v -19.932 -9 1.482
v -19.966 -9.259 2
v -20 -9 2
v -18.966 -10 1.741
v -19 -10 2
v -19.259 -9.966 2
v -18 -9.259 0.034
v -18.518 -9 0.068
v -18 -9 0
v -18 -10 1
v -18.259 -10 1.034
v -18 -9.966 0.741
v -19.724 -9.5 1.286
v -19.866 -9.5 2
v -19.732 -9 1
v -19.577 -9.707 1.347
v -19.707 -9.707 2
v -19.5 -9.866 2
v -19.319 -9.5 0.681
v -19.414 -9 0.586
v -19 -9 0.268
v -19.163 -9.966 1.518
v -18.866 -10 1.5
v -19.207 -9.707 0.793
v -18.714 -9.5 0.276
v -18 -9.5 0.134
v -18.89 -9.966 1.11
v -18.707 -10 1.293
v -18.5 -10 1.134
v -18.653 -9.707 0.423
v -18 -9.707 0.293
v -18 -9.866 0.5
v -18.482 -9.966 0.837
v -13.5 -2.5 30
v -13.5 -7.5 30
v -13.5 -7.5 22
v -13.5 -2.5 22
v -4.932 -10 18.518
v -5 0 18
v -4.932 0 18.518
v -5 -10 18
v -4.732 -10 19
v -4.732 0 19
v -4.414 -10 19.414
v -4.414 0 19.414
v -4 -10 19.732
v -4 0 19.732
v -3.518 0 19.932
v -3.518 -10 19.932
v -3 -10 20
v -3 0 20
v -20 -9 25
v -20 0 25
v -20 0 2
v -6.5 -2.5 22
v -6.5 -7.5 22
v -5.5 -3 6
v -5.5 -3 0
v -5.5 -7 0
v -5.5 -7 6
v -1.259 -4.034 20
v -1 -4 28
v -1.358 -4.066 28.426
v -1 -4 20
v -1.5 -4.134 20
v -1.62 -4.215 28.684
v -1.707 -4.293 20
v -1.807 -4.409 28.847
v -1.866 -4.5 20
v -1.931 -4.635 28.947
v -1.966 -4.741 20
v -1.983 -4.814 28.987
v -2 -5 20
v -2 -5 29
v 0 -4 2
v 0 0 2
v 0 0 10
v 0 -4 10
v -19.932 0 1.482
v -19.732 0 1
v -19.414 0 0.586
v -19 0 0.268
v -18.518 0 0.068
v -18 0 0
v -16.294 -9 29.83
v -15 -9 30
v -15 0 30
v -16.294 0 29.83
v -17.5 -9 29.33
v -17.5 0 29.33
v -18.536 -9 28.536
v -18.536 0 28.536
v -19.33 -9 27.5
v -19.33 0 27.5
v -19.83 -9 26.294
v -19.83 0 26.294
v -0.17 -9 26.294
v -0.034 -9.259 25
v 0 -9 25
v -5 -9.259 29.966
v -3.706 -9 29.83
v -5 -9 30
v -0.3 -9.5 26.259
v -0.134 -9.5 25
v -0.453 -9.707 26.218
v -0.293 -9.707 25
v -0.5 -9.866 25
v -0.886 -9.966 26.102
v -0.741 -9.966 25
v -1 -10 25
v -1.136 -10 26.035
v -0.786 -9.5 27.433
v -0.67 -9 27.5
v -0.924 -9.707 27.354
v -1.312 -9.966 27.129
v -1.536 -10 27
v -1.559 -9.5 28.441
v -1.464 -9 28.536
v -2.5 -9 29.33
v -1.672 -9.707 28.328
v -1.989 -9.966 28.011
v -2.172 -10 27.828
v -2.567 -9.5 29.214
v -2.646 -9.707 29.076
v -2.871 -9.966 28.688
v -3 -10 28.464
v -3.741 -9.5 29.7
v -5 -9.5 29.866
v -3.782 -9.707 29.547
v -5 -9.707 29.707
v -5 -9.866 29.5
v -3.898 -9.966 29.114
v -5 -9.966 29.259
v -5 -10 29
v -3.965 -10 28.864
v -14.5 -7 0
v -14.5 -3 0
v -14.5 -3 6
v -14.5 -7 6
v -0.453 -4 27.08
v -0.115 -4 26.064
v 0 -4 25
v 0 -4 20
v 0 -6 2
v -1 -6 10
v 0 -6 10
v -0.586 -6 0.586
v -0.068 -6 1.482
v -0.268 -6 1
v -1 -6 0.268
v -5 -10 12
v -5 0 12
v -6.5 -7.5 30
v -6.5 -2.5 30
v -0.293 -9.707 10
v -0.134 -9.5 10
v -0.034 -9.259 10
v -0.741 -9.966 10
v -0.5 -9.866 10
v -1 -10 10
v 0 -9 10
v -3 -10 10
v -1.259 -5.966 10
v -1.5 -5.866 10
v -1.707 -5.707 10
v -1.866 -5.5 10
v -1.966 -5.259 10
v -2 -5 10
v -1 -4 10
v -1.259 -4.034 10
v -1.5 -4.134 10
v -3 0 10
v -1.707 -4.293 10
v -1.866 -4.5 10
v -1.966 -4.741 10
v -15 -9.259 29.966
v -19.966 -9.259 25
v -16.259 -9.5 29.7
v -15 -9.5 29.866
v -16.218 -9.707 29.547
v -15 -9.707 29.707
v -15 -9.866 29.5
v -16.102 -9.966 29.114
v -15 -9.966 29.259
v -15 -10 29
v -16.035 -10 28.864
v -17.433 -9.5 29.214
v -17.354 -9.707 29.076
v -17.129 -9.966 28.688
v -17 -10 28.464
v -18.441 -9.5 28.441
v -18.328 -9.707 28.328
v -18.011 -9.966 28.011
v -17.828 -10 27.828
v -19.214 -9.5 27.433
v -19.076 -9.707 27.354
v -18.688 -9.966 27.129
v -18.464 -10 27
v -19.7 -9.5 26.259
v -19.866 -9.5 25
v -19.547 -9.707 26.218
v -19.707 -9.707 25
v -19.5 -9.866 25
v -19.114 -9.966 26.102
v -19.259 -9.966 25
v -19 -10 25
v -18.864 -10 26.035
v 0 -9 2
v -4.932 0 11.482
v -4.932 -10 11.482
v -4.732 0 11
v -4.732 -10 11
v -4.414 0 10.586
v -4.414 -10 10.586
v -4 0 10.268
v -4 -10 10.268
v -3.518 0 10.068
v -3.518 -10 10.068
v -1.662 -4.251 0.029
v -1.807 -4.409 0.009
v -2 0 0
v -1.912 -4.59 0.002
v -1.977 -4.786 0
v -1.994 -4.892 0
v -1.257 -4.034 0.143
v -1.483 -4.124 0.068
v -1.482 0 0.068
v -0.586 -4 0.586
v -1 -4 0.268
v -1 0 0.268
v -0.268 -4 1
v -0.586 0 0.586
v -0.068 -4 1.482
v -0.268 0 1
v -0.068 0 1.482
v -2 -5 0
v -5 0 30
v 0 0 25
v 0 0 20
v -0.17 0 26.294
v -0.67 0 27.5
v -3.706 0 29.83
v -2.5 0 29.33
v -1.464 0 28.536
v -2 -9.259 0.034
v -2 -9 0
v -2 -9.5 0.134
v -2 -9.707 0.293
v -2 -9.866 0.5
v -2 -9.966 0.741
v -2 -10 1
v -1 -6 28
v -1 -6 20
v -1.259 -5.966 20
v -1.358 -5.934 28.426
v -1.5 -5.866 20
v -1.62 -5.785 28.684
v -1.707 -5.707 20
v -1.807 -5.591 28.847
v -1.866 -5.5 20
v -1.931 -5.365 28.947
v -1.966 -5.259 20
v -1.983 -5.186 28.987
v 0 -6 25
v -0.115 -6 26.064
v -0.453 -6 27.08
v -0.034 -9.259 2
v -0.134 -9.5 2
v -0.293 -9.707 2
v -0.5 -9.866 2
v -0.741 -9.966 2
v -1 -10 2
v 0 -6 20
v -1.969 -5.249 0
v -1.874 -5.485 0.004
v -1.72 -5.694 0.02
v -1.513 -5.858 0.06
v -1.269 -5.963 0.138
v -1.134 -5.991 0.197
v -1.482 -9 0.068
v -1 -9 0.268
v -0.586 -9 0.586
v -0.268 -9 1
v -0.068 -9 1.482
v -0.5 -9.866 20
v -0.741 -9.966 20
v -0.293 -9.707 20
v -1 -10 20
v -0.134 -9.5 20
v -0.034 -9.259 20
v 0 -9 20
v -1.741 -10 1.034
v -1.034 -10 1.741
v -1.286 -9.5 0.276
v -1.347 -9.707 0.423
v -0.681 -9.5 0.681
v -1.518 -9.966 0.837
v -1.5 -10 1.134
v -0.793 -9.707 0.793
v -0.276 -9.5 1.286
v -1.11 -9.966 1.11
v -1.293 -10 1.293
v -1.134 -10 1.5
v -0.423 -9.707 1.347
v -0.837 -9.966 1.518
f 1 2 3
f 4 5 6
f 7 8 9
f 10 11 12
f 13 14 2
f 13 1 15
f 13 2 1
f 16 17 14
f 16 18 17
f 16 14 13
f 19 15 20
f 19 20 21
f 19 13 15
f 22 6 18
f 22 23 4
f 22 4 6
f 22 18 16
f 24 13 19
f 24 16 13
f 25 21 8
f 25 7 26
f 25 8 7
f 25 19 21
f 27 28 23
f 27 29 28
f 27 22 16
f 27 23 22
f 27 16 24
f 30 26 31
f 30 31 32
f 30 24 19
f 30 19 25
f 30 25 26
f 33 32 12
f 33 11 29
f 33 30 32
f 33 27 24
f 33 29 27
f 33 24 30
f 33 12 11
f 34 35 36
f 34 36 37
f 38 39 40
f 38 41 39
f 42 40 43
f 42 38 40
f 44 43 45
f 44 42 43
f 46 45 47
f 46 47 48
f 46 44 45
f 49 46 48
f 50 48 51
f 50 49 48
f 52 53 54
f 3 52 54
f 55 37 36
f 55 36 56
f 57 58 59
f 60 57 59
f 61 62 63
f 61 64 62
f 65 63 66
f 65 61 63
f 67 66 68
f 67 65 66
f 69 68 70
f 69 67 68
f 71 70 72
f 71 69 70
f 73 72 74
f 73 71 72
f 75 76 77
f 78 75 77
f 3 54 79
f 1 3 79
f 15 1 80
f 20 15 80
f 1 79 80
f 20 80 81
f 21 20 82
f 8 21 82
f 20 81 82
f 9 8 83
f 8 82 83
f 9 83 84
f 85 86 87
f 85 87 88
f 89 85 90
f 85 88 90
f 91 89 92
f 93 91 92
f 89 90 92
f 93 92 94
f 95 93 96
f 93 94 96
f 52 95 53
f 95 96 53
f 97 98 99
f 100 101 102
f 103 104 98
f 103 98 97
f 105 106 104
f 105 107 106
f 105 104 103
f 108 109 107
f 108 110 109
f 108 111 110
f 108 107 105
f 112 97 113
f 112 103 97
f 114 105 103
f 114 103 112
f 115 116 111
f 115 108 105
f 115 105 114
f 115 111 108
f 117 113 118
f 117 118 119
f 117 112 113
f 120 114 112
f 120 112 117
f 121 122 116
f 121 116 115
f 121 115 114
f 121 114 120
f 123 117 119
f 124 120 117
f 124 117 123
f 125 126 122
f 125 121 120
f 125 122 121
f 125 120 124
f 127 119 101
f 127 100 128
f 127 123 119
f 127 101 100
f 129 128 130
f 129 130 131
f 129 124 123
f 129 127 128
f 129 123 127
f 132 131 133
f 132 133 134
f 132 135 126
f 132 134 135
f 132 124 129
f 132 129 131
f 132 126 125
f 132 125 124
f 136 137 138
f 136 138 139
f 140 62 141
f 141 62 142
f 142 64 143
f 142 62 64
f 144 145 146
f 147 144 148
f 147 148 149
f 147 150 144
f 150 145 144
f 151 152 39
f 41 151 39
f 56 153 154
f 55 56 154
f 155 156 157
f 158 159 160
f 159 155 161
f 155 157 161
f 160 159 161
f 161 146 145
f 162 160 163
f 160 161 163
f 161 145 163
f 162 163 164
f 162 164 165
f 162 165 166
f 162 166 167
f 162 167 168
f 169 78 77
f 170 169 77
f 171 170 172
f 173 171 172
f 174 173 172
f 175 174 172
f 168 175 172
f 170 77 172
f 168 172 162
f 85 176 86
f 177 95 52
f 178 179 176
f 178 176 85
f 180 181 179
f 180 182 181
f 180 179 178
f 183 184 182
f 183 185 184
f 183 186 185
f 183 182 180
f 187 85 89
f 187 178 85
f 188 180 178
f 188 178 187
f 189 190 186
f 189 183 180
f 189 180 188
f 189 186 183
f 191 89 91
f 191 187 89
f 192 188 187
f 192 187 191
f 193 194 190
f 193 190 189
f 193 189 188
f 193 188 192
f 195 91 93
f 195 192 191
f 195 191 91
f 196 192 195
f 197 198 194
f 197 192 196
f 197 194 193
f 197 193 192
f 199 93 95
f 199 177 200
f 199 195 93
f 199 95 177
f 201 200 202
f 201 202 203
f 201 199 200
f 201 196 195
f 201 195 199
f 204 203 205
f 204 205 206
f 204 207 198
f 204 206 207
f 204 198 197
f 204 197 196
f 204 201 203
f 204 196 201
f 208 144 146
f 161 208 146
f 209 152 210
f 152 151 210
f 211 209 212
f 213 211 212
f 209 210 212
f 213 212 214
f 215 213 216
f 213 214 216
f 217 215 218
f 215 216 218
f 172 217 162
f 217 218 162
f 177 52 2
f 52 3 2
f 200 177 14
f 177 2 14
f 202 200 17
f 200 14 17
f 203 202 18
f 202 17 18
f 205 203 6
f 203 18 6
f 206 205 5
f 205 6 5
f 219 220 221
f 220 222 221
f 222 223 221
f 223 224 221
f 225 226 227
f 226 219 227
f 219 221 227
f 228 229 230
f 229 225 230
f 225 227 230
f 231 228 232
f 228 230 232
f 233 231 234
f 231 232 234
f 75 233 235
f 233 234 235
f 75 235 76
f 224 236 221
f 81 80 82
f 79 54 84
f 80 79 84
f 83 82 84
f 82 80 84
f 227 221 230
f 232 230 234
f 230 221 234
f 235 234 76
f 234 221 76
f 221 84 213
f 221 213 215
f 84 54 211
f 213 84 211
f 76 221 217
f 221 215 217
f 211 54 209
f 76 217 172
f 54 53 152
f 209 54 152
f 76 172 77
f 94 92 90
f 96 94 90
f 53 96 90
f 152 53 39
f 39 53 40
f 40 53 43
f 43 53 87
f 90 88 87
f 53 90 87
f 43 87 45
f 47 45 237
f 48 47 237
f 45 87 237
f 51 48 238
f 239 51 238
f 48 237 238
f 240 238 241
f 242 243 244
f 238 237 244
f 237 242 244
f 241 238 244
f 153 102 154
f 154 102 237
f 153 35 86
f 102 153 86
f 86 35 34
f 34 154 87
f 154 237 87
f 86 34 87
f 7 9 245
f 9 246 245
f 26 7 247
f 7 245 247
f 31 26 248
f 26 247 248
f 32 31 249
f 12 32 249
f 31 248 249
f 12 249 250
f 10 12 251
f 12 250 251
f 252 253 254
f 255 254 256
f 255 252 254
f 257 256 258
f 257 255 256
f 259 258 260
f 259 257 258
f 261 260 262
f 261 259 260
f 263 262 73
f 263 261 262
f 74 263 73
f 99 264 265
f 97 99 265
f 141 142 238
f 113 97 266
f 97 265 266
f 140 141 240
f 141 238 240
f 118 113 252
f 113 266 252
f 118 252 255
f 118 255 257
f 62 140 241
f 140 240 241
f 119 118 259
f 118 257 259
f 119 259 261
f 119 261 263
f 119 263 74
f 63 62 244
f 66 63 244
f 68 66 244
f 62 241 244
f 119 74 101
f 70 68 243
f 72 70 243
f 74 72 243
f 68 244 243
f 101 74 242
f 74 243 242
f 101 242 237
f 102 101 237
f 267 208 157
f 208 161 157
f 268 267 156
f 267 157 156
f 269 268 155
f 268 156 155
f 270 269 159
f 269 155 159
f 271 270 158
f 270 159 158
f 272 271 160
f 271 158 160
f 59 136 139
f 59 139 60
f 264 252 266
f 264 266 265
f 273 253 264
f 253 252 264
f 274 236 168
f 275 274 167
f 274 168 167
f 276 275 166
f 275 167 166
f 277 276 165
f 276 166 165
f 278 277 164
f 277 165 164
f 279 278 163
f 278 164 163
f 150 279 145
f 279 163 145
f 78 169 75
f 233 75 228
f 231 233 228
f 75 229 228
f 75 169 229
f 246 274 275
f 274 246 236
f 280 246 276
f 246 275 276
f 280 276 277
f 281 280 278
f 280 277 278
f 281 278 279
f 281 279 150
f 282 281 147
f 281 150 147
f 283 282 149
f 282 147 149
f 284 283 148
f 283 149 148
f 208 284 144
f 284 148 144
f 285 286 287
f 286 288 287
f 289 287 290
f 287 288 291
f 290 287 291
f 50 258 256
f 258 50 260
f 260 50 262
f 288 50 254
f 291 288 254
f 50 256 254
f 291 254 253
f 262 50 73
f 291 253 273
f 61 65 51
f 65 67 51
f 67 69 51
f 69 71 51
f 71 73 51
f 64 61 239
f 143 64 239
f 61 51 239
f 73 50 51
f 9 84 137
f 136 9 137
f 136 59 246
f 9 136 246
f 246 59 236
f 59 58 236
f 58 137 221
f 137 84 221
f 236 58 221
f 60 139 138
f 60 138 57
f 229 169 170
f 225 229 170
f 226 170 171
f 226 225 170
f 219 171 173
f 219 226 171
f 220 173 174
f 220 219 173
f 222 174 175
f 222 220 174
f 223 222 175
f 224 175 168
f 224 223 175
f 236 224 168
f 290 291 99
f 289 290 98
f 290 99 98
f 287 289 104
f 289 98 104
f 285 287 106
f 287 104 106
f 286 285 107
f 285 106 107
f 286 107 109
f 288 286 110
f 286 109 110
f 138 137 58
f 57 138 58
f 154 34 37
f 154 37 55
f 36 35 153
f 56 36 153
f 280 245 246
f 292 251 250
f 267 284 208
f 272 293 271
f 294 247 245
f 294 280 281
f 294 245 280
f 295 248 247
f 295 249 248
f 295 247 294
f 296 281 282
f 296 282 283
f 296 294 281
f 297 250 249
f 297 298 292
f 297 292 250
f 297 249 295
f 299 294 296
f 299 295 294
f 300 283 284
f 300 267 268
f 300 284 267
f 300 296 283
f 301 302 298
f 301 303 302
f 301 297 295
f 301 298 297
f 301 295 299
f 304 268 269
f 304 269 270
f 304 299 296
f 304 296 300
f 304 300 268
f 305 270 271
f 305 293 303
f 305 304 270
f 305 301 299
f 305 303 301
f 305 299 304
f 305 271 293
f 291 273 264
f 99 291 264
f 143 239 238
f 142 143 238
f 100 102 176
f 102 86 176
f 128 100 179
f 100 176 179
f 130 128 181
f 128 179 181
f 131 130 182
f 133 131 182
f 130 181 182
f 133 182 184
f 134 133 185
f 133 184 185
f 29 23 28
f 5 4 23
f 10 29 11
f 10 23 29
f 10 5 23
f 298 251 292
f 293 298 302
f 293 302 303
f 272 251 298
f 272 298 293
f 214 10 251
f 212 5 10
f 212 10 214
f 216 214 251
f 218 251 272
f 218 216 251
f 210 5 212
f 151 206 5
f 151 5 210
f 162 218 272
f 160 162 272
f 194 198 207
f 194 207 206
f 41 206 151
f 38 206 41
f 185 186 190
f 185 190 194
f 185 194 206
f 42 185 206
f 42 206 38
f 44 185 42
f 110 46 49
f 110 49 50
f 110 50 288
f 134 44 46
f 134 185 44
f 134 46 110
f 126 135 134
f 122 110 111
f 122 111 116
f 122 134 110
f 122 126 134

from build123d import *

# Parameters (mm, degrees)
F1_DEPTH  = 10
F2_R      = 1
F3_W      = 2
F3_H      = 2
F4_DEPTH  = 20
F5_R      = 2
F6_R      = 2
F7_W      = 7
F7_H      = 5
F8_DEPTH  = 8
F9_R      = 0.99999
F10_W     = 9
F10_H     = 4
F11_DEPTH = 6


# Not quite as in the source:
# - a fillet or chamfer is up to 0.001 mm smaller than in the source, because OpenCascade refuses the exact size


with BuildPart() as f1:
    # F0 (on Front) → F1 (new body)
    with BuildSketch(Plane.XZ):
        with BuildLine():
            Line((-18, 0), (-2, 0))
            ThreePointArc((-2, 0), (-0.5857864376, 0.5857864376), (0, 2))
            Line((0, 2), (0, 10))
            Line((0, 10), (-5, 10))
            Line((-5, 10), (-5, 20))
            Line((-5, 20), (0, 20))
            Line((0, 20), (0, 25))
            ThreePointArc((0, 25), (-1.4644660941, 28.5355339059), (-5, 30))
            Line((-5, 30), (-15, 30))
            ThreePointArc((-15, 30), (-18.5355339059, 28.5355339059), (-20, 25))
            Line((-20, 25), (-20, 2))
            ThreePointArc((-20, 2), (-19.4142135624, 0.5857864376), (-18, 0))
        make_face()
    extrude(amount=F1_DEPTH)

    # F2
    f2_edges = [f1.edges().sort_by_distance(p)[0] for p in [
        (-10, -10, 30),
    ]]
    fillet(f2_edges, radius=F2_R)

    # F3 (on face) → F4 (cut, symmetric)
    with BuildSketch(Plane(origin=(0, 0, 20), x_dir=(1, 0, 0), z_dir=(0, 0, -1))):
        with Locations((-1, 5)):
            Rectangle(F3_W, F3_H)
    extrude(amount=F4_DEPTH, both=True, mode=Mode.SUBTRACT)

    # F5
    f5_edges = [f1.edges().sort_by_distance(p)[0] for p in [
        (-5, -5, 20),
    ]]
    fillet(f5_edges, radius=F5_R)

    # F6
    f6_edges = [f1.edges().sort_by_distance(p)[0] for p in [
        (-5, -5, 10),
    ]]
    fillet(f6_edges, radius=F6_R)

    # F7 (on face) → F8 (cut)
    with BuildSketch(Plane.XY.offset(30)):
        with Locations((-10, -5)):
            Rectangle(F7_W, F7_H)
    extrude(amount=-F8_DEPTH, mode=Mode.SUBTRACT)

    # F9 (radius 1 in the source; OpenCascade refuses exactly that, so slightly less here)
    f9_edges = [f1.edges().sort_by_distance(p)[0] for p in [
        (-2, -4, 24.5),
        (-2, -6, 24.5),
        (-2, -6, 5),
        (-2, -4, 5),
    ]]
    fillet(f9_edges, radius=F9_R)

    # F10 (on face) → F11 (cut)
    with BuildSketch(Plane(origin=(0, 0, 0), x_dir=(1, 0, 0), z_dir=(0, 0, -1))):
        with Locations((-10, 5)):
            Rectangle(F10_W, F10_H)
    extrude(amount=-F11_DEPTH, mode=Mode.SUBTRACT)


solid = f1.part
